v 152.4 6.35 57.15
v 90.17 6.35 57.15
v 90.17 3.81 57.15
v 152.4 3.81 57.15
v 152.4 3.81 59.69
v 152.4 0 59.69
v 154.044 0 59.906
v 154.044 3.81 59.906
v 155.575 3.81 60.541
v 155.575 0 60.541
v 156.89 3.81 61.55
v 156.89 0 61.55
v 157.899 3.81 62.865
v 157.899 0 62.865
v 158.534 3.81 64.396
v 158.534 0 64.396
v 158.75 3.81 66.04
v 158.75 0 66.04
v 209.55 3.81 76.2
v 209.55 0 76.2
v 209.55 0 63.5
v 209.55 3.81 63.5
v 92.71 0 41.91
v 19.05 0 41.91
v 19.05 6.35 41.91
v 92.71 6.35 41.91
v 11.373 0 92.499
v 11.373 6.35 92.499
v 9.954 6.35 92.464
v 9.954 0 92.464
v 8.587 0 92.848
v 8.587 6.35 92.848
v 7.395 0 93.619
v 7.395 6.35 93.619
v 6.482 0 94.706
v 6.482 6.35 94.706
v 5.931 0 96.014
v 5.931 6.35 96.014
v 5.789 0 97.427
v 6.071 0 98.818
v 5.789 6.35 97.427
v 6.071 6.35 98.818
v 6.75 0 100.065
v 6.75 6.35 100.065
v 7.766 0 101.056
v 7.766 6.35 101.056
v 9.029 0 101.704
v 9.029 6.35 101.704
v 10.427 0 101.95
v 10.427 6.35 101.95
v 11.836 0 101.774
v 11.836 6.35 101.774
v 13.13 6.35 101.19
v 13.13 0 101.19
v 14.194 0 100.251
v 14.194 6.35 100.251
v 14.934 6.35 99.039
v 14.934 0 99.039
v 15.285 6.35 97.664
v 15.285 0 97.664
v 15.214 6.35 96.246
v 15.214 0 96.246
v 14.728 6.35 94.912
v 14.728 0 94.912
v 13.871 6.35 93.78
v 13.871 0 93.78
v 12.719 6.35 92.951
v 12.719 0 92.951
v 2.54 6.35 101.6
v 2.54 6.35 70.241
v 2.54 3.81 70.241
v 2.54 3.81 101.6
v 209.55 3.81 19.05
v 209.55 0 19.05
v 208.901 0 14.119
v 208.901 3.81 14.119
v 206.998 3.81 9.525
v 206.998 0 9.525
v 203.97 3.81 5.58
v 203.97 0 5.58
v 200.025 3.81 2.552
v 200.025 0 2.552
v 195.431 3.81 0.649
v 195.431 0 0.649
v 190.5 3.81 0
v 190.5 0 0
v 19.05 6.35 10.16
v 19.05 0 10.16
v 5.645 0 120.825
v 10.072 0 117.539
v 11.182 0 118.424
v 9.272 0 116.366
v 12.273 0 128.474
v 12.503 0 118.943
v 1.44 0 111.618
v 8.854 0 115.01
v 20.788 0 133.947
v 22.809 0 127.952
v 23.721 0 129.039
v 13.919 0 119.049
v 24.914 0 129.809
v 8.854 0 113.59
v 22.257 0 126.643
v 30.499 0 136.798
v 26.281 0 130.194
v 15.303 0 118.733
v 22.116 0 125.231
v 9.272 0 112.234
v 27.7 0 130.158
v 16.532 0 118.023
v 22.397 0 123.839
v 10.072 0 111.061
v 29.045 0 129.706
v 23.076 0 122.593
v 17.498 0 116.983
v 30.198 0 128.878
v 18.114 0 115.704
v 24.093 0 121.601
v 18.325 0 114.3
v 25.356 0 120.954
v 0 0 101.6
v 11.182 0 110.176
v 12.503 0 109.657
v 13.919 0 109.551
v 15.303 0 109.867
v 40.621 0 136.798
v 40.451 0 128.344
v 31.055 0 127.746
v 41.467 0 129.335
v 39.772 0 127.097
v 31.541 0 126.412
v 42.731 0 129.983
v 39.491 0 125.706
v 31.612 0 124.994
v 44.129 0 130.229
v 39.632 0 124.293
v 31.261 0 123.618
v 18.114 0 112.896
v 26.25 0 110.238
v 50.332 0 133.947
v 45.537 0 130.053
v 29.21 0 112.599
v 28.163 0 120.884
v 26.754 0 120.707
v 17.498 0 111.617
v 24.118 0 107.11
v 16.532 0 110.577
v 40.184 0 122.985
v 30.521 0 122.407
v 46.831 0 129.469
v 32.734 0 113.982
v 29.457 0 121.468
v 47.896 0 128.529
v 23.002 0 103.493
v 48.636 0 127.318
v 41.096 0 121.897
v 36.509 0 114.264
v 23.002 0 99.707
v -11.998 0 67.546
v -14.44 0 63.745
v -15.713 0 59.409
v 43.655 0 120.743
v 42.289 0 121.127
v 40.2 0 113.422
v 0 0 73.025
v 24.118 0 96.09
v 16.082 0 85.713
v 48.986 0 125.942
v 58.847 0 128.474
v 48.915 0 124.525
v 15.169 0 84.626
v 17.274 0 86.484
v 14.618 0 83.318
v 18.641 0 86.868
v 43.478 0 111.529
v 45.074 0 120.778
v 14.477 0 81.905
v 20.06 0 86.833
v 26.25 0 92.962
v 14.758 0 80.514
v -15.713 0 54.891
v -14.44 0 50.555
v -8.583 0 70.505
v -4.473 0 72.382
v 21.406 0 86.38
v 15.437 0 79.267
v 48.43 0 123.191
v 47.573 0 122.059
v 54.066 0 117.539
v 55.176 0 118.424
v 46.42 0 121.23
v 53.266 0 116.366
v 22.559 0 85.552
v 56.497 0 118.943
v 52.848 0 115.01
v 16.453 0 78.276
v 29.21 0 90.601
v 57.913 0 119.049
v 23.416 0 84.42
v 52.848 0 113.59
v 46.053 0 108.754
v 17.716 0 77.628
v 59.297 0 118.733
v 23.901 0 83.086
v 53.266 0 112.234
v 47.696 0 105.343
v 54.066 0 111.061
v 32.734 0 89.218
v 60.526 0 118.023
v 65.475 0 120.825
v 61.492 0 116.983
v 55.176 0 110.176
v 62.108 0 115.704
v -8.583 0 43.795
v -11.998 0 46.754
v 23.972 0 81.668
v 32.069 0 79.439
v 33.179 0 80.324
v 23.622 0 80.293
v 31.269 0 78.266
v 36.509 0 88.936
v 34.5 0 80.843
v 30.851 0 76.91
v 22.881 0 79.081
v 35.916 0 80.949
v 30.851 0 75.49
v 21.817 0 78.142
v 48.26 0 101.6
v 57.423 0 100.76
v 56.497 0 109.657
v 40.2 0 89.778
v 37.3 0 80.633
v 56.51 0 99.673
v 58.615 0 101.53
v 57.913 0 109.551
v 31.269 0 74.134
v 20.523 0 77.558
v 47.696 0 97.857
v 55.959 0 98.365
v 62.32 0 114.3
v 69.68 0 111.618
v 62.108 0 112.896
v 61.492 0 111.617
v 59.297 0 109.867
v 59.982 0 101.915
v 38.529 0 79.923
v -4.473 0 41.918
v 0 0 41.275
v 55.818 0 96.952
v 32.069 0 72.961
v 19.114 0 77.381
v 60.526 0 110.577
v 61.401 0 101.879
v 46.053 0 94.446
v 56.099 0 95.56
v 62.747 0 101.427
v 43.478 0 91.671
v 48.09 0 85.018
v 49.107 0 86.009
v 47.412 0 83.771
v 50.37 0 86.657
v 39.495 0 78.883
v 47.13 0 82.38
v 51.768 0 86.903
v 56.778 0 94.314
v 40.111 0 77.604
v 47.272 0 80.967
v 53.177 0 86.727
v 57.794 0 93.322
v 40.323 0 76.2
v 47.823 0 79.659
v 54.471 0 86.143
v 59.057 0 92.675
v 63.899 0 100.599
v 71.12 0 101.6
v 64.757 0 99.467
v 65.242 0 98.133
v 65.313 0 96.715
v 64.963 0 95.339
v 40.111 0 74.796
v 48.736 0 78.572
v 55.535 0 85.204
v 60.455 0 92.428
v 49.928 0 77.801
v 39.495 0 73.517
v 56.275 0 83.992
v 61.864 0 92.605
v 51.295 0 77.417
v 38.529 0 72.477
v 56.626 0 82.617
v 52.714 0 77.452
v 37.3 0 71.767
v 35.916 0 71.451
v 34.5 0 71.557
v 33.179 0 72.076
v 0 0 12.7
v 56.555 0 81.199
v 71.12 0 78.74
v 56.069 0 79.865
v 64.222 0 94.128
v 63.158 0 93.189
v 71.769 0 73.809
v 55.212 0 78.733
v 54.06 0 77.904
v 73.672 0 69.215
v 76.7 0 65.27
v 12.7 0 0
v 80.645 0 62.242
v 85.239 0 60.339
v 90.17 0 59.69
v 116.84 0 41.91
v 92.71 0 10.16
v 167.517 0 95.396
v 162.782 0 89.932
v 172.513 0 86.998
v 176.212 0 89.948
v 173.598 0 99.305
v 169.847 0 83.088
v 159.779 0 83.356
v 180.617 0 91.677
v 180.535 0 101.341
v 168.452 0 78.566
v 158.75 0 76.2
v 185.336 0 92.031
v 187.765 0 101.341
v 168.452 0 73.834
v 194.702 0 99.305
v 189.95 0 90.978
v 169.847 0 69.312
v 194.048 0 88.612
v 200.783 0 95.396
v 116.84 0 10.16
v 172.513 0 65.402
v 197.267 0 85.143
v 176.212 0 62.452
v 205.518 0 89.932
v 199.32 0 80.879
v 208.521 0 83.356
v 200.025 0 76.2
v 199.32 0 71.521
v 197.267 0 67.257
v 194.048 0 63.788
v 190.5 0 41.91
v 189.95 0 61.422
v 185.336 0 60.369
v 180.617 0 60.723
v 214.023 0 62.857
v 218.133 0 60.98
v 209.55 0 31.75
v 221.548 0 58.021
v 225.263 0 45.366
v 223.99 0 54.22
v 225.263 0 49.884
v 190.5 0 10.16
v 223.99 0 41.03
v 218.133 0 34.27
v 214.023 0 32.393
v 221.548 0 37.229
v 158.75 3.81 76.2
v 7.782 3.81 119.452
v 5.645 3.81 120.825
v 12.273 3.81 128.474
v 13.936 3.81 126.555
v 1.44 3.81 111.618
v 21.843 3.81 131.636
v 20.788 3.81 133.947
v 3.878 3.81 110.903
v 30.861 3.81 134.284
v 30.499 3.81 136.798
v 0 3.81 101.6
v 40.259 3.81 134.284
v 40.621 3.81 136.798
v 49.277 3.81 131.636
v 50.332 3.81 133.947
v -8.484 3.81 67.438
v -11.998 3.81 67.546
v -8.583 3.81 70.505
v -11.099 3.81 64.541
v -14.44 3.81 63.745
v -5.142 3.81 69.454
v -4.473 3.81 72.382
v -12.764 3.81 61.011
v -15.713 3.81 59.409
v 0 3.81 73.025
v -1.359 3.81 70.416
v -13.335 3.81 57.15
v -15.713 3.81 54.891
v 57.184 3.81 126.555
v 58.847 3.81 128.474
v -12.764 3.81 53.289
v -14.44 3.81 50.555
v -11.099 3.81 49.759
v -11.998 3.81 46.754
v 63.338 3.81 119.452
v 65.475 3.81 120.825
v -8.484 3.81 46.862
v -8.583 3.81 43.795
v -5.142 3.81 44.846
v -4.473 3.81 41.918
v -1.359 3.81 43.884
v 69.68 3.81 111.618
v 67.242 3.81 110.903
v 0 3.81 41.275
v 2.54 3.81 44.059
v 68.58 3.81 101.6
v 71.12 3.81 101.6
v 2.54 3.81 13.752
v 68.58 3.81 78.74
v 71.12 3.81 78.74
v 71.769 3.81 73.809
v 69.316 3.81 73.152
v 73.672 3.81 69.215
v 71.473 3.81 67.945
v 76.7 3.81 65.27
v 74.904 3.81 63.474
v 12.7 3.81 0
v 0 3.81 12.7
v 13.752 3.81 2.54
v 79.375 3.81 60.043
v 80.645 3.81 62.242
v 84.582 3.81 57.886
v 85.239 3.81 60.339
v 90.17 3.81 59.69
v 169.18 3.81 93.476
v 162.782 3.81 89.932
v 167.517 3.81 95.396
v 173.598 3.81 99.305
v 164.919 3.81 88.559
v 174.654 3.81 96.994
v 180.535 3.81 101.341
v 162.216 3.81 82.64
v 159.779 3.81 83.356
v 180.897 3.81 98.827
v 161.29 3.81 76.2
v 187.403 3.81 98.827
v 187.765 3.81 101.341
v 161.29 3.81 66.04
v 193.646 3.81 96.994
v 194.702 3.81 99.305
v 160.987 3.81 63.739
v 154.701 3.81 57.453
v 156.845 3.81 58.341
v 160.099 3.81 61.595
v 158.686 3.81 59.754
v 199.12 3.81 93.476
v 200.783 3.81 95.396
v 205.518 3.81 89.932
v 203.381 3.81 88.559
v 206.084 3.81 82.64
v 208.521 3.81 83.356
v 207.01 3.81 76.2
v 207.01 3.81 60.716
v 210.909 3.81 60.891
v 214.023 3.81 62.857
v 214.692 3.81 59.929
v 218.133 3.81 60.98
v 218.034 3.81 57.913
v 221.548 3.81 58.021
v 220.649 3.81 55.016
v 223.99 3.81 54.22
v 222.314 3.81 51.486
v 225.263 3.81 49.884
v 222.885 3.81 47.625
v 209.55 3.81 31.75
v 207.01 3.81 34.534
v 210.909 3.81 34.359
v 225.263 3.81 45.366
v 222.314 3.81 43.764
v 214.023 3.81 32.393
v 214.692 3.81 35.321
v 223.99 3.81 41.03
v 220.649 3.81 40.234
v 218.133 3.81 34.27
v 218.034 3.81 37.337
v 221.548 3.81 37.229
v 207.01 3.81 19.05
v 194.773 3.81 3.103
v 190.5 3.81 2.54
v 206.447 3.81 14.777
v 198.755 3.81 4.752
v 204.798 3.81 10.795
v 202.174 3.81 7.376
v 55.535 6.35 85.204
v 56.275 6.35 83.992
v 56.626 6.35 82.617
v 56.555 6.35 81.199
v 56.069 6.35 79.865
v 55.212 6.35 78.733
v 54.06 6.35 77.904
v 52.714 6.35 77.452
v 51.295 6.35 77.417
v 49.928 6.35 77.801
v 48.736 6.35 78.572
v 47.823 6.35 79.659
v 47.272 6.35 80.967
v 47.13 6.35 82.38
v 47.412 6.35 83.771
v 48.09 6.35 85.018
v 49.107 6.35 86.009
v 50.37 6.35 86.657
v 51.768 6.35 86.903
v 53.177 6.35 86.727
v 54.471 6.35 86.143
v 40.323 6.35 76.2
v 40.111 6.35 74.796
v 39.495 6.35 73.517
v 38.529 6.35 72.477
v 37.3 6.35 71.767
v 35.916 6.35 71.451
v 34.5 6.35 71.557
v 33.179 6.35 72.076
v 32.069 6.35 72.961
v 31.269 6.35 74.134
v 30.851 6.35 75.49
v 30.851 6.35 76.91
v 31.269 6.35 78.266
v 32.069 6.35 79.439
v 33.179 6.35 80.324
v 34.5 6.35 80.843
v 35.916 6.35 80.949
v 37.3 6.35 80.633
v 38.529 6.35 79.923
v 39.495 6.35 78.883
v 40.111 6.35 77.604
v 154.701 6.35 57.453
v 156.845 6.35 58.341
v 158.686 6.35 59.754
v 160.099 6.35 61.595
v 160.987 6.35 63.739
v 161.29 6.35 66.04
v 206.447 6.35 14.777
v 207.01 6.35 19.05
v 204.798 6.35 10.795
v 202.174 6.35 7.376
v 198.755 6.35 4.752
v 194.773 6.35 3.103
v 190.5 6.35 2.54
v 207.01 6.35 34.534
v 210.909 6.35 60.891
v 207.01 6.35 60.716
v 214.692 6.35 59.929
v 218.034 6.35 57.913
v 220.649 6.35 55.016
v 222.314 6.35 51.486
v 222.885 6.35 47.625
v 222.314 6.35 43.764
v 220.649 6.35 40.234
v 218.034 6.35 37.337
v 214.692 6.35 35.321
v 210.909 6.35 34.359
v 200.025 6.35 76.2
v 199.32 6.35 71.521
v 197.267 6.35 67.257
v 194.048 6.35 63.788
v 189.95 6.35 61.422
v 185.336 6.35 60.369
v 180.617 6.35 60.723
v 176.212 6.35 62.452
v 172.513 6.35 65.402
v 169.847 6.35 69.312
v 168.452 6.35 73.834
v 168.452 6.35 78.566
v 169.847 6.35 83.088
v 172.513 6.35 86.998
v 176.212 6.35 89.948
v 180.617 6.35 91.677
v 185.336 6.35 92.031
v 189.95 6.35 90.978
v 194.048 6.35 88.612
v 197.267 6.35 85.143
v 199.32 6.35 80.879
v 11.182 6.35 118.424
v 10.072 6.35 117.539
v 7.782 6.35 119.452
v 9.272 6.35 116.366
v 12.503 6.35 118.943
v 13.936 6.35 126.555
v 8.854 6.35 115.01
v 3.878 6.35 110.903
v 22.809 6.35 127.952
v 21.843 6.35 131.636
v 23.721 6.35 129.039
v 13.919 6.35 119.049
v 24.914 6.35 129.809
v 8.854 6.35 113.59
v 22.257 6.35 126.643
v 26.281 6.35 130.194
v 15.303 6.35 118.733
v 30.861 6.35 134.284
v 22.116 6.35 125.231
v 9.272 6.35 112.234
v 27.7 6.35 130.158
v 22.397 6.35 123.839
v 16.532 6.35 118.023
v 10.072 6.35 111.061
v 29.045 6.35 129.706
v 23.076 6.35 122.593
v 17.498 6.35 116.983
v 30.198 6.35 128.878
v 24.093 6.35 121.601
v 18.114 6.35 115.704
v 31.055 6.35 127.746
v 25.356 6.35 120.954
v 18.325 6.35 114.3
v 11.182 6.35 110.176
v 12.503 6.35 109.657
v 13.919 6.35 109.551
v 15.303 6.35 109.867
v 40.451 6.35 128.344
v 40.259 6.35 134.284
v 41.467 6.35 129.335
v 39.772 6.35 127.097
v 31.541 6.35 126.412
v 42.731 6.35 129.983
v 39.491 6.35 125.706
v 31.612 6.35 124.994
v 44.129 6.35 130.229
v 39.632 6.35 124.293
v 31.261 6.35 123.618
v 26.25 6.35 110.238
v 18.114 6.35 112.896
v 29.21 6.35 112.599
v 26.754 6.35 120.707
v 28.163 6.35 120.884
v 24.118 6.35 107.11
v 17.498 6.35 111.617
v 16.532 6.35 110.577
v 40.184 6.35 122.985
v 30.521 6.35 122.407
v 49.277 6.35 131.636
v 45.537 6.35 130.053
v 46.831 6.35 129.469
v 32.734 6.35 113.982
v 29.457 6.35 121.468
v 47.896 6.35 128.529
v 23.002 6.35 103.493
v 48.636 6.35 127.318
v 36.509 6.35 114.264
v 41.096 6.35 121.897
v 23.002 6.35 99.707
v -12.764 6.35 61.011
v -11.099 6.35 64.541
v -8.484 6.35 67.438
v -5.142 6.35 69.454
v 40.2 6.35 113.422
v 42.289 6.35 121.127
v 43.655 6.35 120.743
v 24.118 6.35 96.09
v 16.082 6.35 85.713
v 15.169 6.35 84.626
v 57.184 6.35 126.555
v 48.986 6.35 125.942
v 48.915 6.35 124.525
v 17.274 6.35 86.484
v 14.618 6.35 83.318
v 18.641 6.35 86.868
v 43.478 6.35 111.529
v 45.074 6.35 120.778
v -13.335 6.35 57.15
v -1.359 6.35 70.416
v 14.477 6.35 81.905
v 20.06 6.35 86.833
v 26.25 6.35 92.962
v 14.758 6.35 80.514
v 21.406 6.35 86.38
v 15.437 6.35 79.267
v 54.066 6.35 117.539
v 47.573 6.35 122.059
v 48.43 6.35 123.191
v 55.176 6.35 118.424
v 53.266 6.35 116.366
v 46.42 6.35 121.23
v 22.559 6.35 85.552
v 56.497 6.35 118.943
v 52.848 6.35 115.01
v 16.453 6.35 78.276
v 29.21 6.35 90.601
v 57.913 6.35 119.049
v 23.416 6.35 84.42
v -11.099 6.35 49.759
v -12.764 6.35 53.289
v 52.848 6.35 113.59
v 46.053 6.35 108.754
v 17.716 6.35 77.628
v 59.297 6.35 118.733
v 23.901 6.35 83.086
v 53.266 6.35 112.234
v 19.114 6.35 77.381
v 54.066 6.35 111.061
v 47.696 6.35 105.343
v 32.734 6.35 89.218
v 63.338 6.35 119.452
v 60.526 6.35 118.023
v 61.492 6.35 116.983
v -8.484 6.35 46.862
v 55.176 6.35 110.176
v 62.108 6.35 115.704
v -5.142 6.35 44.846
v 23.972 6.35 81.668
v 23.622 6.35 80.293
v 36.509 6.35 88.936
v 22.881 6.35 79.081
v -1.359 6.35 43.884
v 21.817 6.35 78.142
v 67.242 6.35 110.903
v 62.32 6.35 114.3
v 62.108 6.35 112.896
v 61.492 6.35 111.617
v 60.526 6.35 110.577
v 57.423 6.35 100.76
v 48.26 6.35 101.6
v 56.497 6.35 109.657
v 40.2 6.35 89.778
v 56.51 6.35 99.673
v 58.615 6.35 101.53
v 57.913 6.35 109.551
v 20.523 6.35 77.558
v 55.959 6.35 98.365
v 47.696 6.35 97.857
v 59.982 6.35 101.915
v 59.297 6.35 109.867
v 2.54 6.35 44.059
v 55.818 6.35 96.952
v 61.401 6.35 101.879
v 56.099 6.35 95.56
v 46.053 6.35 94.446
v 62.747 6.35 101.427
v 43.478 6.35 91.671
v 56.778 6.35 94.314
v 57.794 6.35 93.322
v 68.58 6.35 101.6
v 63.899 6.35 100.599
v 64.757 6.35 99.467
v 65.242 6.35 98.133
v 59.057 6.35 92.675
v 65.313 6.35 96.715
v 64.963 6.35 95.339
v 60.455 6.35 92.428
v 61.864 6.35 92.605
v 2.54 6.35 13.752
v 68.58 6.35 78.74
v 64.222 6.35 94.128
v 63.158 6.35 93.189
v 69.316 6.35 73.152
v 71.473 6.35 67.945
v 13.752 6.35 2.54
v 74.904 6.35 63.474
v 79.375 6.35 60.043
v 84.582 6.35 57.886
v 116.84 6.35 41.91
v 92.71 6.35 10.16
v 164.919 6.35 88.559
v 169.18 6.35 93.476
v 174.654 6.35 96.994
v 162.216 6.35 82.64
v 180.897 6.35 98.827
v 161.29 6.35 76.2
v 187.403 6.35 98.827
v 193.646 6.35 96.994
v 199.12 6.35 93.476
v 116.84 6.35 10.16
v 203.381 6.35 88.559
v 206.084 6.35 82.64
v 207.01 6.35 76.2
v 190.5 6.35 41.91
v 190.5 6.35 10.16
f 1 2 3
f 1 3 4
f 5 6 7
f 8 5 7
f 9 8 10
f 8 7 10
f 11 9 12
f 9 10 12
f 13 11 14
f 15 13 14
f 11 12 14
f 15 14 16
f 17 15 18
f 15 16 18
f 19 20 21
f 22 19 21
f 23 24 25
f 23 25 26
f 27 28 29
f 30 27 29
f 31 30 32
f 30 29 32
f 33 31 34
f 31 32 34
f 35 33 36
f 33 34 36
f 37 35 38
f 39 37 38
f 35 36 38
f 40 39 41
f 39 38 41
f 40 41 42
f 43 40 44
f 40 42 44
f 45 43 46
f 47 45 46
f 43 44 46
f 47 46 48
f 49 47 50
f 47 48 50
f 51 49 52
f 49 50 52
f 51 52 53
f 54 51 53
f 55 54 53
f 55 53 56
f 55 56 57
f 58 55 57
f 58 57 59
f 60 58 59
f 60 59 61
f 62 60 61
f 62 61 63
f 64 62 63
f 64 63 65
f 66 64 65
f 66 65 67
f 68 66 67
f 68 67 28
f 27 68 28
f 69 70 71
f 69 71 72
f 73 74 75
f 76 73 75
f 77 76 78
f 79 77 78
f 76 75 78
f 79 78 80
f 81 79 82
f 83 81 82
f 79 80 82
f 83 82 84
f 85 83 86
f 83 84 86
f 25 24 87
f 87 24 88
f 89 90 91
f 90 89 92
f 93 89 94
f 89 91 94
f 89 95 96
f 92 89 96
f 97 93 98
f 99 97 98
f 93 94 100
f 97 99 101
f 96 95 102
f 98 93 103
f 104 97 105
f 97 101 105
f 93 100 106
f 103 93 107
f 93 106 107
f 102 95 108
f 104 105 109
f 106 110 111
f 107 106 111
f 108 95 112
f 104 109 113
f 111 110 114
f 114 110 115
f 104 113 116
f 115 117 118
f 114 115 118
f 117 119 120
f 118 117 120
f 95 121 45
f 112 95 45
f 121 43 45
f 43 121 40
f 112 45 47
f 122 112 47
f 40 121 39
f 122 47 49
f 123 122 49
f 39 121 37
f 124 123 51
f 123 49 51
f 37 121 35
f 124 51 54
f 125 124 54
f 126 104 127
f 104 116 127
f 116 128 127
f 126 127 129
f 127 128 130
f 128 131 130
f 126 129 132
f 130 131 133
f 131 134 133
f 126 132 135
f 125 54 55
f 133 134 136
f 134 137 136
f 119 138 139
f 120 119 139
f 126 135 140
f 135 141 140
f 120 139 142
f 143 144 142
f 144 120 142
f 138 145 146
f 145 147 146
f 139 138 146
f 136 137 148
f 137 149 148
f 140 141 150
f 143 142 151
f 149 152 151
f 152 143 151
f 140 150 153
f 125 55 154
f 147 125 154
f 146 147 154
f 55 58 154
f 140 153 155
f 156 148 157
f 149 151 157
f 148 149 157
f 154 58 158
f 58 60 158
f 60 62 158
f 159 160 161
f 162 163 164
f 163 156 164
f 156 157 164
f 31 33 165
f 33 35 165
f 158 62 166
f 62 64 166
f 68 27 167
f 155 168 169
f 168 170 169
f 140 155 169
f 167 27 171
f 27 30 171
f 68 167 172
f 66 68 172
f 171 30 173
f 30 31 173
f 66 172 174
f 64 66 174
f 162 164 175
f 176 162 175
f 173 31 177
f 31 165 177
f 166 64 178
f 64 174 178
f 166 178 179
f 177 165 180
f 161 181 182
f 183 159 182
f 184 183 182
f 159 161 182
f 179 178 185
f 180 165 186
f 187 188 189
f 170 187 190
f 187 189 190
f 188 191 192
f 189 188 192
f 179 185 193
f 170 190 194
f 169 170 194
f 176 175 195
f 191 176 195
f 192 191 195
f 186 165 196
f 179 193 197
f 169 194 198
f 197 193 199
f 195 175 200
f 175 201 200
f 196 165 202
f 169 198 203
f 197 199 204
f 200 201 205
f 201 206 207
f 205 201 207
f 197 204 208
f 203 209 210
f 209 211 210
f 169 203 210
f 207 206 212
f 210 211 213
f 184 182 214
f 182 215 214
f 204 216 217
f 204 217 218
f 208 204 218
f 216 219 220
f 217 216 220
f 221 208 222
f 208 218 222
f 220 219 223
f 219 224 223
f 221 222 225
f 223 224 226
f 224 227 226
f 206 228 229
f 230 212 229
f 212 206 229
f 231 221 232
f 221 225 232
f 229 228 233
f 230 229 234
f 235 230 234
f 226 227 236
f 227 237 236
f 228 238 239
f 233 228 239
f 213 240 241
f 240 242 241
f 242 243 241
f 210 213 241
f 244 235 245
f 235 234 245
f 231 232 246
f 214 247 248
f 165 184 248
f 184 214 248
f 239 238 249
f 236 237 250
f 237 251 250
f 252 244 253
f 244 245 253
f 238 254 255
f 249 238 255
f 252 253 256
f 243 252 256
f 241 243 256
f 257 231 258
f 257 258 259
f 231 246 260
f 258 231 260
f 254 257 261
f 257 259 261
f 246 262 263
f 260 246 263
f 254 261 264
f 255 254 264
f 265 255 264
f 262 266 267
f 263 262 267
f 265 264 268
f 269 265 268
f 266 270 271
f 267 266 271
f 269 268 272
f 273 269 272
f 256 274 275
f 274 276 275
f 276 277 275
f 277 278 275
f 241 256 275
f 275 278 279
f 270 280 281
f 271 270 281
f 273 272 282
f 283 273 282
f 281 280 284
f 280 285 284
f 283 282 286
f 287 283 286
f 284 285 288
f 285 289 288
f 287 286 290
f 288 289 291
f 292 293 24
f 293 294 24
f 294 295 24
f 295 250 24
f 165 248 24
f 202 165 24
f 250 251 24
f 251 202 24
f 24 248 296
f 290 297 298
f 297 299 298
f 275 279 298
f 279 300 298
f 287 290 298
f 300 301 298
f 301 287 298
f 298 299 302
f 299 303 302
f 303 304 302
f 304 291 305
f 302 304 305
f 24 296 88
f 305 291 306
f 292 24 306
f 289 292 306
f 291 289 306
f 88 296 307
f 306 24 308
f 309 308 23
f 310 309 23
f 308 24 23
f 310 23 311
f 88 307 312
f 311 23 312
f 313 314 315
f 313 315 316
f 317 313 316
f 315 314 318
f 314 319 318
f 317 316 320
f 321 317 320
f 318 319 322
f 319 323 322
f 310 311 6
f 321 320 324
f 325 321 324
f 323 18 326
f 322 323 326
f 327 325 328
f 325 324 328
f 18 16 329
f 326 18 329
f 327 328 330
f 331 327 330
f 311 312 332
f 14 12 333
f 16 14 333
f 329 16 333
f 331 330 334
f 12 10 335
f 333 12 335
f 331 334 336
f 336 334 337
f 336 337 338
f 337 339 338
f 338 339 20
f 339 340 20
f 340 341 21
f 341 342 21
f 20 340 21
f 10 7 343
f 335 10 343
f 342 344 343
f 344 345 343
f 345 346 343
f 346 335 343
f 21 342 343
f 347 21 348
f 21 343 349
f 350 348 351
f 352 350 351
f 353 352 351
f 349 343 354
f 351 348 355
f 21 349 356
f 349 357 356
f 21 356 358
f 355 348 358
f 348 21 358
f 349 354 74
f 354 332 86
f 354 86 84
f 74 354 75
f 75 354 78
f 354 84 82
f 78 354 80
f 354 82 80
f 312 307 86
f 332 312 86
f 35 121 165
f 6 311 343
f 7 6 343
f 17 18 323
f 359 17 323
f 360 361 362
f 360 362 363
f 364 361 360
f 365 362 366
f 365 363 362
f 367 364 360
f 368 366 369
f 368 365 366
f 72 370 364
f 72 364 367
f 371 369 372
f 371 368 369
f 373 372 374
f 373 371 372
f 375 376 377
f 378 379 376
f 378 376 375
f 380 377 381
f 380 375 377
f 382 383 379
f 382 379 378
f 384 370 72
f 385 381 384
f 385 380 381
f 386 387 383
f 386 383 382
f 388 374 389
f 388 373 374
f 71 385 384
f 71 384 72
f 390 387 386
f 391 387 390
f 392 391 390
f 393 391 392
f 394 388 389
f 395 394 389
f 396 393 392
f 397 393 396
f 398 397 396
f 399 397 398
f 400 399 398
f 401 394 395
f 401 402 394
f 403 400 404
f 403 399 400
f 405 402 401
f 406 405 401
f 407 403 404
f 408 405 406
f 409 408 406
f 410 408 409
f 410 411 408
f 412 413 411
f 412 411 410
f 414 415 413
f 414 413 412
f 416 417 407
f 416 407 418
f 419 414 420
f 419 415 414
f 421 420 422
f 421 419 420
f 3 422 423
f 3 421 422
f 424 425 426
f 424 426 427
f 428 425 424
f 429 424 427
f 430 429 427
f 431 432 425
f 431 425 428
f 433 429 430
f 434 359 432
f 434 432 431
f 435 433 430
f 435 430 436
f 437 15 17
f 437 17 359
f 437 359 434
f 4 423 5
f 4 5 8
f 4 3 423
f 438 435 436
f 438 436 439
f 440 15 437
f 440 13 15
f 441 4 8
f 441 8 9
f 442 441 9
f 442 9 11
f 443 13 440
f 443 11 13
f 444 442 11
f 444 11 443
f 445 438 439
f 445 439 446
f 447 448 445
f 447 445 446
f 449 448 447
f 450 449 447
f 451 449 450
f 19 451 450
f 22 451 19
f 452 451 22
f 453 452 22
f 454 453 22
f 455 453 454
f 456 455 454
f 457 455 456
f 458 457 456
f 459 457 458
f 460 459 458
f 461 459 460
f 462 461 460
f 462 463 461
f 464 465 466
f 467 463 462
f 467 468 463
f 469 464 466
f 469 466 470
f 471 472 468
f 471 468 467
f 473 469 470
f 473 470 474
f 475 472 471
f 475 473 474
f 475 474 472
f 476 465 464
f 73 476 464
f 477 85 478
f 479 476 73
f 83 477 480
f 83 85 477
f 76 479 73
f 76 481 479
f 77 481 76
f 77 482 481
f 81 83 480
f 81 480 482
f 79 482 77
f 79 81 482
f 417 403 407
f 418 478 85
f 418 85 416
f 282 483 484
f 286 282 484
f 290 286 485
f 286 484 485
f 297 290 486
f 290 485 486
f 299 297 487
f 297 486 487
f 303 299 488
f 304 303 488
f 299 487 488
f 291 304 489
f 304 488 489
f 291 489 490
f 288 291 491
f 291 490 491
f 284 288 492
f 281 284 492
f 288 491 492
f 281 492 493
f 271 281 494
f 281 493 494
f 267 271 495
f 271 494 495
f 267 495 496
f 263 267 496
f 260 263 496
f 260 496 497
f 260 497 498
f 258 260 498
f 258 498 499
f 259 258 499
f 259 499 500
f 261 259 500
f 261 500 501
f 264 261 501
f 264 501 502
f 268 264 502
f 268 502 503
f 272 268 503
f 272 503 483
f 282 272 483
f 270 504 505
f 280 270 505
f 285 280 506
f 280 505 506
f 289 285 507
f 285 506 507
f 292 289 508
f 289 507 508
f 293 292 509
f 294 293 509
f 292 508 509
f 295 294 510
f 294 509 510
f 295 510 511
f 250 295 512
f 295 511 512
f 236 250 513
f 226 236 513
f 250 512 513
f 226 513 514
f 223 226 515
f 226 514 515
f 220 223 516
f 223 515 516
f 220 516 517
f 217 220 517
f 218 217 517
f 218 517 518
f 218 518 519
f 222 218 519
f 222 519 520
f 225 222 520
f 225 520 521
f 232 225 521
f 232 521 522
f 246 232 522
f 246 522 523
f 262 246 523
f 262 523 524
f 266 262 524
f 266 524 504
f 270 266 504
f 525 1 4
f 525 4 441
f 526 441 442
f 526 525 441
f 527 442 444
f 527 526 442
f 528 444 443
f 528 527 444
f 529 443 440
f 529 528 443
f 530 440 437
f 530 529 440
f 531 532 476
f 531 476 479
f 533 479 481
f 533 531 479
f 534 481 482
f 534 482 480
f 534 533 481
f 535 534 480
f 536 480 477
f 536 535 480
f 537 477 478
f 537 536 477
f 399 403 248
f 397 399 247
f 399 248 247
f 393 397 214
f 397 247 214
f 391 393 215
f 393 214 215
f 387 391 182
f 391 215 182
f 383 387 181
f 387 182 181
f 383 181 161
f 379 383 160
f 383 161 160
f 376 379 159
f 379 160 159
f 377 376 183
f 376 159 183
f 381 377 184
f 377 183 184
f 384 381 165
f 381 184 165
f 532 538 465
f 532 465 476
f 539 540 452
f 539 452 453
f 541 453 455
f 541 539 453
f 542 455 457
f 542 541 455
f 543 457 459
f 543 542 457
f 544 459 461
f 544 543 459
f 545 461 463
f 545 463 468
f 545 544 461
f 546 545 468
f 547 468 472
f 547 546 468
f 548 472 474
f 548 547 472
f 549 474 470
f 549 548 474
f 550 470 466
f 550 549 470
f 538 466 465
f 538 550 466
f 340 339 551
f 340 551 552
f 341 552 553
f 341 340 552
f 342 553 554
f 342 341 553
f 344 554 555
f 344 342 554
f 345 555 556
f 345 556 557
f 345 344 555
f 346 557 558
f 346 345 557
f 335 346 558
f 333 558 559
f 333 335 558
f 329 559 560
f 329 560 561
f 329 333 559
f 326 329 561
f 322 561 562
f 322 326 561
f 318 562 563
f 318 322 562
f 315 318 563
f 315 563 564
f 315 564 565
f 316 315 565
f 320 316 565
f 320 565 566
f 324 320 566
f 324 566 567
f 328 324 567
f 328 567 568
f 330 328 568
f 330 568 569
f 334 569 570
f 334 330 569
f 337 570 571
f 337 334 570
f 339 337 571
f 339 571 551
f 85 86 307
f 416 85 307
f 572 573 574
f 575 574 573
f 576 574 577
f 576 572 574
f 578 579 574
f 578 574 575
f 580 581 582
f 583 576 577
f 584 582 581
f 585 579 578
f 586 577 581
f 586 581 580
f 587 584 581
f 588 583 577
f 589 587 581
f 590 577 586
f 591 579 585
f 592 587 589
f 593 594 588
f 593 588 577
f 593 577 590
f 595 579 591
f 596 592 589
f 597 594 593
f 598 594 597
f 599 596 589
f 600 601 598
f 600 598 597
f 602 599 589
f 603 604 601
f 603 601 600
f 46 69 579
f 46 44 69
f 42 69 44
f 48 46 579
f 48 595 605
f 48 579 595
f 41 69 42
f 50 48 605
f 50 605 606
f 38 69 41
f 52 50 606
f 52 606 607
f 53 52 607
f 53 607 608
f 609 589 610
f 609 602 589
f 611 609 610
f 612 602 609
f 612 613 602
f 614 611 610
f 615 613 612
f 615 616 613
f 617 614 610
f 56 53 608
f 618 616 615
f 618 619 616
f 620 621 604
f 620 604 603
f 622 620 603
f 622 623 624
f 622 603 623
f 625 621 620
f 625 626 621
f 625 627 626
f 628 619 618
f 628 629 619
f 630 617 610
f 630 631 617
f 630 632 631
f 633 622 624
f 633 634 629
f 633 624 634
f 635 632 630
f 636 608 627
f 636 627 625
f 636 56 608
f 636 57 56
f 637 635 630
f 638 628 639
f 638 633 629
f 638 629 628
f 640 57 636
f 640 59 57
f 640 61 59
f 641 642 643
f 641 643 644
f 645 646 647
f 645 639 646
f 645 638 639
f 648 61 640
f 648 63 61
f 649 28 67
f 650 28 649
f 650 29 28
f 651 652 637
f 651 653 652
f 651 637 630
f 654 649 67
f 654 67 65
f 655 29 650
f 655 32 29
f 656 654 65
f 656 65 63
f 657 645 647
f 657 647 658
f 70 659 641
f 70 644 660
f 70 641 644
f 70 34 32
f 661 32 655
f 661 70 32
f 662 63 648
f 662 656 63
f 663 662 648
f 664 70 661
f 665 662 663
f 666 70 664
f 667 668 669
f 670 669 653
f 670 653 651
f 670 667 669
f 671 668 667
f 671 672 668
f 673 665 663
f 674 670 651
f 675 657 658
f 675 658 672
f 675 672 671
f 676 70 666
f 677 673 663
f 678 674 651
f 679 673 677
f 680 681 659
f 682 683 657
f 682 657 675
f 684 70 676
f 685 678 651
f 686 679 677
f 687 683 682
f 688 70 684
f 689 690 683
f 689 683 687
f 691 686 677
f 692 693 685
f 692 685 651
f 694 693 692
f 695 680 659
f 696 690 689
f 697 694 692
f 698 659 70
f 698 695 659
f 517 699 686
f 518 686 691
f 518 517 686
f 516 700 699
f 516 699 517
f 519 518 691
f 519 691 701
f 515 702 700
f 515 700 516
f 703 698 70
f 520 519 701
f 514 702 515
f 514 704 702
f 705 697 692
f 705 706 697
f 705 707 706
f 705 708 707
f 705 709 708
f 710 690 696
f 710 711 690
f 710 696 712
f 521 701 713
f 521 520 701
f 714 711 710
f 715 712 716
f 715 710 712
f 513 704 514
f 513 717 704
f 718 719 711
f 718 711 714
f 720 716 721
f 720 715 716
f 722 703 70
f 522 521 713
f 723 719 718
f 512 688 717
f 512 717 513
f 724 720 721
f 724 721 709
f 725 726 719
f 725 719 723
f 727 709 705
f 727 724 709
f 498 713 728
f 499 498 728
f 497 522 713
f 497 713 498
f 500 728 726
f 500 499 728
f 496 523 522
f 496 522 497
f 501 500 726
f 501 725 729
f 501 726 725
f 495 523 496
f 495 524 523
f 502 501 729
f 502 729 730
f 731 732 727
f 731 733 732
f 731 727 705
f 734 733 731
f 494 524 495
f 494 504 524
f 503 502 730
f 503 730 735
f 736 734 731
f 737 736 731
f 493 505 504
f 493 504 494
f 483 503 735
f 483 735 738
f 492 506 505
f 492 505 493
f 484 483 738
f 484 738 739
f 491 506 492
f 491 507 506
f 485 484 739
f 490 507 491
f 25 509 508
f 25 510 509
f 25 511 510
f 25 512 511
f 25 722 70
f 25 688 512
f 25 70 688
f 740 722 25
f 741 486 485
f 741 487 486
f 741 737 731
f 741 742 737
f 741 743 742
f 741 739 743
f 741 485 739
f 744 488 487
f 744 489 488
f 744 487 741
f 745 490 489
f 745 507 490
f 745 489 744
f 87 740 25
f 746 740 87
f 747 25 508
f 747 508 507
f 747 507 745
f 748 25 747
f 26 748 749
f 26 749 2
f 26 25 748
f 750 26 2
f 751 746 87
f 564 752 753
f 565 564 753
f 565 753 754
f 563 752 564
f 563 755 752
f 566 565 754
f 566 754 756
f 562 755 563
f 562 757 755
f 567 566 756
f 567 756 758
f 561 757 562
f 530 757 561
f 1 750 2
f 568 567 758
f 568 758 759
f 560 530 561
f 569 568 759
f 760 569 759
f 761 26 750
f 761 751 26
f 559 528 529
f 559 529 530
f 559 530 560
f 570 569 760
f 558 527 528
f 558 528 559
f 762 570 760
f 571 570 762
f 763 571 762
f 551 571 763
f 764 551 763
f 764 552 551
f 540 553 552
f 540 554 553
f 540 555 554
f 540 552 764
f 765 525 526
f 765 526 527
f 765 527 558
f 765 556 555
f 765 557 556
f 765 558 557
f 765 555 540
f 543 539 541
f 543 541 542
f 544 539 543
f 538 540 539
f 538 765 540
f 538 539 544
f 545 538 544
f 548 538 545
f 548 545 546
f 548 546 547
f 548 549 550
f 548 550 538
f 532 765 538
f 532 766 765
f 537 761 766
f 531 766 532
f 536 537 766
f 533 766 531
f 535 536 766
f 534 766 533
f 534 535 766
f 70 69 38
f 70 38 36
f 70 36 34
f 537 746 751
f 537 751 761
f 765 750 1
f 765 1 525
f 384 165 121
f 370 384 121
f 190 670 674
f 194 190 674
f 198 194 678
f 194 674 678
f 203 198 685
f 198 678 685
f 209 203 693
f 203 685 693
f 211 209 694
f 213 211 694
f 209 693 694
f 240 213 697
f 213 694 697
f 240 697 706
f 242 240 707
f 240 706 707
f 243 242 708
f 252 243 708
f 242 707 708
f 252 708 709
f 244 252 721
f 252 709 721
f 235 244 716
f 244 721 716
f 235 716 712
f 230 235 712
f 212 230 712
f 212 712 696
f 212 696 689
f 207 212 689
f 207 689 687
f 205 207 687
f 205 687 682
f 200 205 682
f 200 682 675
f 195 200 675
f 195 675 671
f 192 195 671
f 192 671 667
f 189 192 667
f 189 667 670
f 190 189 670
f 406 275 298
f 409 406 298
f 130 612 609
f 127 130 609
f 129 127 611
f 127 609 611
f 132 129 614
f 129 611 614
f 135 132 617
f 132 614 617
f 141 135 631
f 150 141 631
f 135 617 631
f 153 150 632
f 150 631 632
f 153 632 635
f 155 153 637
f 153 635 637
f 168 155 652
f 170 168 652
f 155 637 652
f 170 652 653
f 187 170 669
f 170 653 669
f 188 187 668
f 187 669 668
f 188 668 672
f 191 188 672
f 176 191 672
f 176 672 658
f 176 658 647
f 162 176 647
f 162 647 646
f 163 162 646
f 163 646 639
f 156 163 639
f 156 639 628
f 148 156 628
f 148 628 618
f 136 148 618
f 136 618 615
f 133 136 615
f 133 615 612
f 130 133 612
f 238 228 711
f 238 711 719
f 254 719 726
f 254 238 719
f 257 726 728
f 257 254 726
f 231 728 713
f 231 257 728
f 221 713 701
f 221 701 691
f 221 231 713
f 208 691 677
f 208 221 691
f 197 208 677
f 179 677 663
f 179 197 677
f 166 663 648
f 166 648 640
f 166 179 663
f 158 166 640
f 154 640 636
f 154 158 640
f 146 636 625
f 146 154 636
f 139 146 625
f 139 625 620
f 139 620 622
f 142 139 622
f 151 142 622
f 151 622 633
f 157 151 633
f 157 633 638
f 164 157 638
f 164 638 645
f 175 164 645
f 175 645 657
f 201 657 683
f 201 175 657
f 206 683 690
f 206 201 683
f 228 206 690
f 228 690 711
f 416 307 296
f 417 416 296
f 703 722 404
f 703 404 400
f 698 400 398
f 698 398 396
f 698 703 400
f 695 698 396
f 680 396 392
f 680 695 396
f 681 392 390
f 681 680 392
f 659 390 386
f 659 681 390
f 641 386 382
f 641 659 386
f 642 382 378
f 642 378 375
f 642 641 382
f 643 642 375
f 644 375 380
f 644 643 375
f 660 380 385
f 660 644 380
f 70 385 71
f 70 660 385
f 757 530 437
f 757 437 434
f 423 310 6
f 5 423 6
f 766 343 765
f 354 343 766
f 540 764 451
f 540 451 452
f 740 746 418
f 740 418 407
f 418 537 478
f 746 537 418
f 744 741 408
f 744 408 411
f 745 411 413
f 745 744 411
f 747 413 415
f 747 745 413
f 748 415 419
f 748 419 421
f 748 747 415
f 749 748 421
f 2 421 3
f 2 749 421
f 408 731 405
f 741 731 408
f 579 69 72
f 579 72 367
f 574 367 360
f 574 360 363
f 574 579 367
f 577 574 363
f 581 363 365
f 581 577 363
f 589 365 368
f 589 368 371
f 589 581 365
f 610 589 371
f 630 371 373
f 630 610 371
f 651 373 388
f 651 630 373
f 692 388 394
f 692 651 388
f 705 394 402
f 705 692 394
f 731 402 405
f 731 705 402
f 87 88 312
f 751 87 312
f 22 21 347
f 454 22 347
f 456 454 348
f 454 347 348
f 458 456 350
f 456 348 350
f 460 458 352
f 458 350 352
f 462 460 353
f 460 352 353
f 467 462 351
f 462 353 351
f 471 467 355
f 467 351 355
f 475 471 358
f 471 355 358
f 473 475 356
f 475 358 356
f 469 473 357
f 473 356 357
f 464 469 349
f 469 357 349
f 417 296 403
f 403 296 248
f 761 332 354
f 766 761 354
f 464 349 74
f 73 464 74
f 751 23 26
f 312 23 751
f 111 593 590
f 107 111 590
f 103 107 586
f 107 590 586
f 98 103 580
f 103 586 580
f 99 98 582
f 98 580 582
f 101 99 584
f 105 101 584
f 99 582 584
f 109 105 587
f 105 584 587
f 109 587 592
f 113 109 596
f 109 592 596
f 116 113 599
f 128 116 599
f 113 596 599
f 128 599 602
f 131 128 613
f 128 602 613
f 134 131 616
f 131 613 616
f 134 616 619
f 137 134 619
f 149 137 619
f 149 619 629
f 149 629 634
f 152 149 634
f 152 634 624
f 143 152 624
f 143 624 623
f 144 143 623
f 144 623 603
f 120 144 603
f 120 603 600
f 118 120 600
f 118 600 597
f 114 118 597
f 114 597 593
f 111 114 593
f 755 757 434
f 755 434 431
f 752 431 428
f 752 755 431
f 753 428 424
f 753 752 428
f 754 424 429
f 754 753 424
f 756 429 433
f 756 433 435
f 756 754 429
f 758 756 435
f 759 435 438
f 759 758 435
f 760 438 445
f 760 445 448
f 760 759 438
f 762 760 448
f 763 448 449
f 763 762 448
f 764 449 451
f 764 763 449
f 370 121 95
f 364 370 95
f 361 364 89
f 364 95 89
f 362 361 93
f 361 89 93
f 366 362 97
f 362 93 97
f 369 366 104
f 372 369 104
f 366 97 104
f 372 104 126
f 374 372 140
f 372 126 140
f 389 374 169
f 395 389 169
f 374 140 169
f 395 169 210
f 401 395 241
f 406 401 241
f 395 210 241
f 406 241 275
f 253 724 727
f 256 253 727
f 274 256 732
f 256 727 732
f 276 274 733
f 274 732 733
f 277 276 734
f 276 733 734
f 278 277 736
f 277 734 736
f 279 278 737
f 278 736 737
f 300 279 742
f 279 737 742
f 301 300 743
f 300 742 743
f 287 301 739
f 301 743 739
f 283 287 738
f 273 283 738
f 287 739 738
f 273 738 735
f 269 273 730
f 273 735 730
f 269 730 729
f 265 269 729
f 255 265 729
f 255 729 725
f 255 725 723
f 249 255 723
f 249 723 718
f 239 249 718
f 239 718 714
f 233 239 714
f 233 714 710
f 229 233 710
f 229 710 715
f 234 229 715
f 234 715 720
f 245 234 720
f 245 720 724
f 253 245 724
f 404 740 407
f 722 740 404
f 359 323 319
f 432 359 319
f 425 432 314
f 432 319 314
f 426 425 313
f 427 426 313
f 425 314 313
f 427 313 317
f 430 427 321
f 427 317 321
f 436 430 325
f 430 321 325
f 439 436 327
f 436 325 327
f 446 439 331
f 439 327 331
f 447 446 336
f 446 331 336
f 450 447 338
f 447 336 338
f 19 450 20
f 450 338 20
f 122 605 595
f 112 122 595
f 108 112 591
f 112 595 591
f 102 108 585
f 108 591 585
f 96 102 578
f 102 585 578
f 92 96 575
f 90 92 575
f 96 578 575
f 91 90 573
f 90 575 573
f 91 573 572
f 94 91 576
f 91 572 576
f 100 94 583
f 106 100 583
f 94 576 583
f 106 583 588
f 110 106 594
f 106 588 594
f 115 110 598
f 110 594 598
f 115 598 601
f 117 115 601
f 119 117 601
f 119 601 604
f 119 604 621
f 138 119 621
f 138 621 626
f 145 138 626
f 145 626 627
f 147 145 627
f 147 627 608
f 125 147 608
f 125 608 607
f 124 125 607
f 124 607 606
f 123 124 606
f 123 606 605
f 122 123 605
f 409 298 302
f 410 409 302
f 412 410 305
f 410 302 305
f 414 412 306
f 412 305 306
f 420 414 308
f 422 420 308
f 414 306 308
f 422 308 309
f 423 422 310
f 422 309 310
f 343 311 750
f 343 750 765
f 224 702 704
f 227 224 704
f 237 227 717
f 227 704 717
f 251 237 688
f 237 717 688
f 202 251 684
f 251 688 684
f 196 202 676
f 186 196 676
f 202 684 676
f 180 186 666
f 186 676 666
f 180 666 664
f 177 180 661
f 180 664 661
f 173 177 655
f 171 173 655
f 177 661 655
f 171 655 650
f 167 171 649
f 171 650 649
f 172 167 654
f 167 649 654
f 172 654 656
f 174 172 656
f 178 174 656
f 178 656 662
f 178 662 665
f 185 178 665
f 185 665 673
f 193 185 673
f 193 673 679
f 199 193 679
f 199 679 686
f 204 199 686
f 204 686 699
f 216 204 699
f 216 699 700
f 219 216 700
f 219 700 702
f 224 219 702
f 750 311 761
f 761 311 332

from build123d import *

# Parameters (mm, degrees)
SKETCH1_R           = 15.875
SKETCH1_R_2         = 12.7
SKETCH1_W           = 73.66
SKETCH1_H           = 31.75
BOSS_EXTRUDE2_DEPTH = 6.35
CUT_EXTRUDE1_DEPTH  = 2.54
SKETCH3_R           = 4.7625
CUT_EXTRUDE2_DEPTH  = 7.35
CIRPATTERN1_COUNT   = 9


with BuildPart() as part:
    # Sketch1 → Boss-Extrude2 (new body)
    with BuildSketch(Plane(origin=(0, 0, 0), x_dir=(1, 0, 0), z_dir=(0, 1, 0))):
        with Locations((209.55, -47.625)):
            Circle(SKETCH1_R)
        with Locations((0, -57.15)):
            Circle(SKETCH1_R)
        with BuildLine():
            Line((209.55, -76.2), (209.55, -19.05))
            ThreePointArc((209.55, -19.05), (203.970384182, -5.579615818), (190.5, 0))
            Line((190.5, 0), (12.7, 0))
            Line((12.7, 0), (0, -12.7))
            Line((0, -12.7), (0, -101.6))
            ThreePointArc((0, -101.6), (35.56, -137.16), (71.12, -101.6))
            Line((71.12, -101.6), (71.12, -78.74))
            ThreePointArc((71.12, -78.74), (76.699615818, -65.269615818), (90.17, -59.69))
            Line((90.17, -59.69), (152.4, -59.69))
            ThreePointArc((152.4, -59.69), (156.890128061, -61.549871939), (158.75, -66.04))
            Line((158.75, -66.04), (158.75, -76.2))
            ThreePointArc((158.75, -76.2), (184.15, -101.6), (209.55, -76.2))
        make_face()
        with Locations((35.56, -101.6)):
            Circle(SKETCH1_R_2, mode=Mode.SUBTRACT)
        with Locations((184.15, -76.2)):
            Circle(SKETCH1_R, mode=Mode.SUBTRACT)
        with Locations((153.67, -26.035)):
            Rectangle(SKETCH1_W, SKETCH1_H, mode=Mode.SUBTRACT)
        with Locations((55.88, -26.035)):
            Rectangle(SKETCH1_W, SKETCH1_H, mode=Mode.SUBTRACT)
        with BuildLine():
            ThreePointArc((15.875, -57.15), (11.225320151, -45.924679849), (0, -41.275))
            Line((0, -41.275), (0, -73.025))
            ThreePointArc((0, -73.025), (11.225320151, -68.375320151), (15.875, -57.15))
        make_face()
        with BuildLine():
            Line((0, -73.025), (0, -41.275))
            ThreePointArc((0, -41.275), (-15.875, -57.15), (0, -73.025))
        make_face()
        with BuildLine():
            ThreePointArc((15.875, -57.15), (11.225320151, -45.924679849), (0, -41.275))
            Line((0, -41.275), (0, -73.025))
            ThreePointArc((0, -73.025), (11.225320151, -68.375320151), (15.875, -57.15))
        make_face()
        with BuildLine():
            Line((0, -73.025), (0, -41.275))
            ThreePointArc((0, -41.275), (-15.875, -57.15), (0, -73.025))
        make_face()
        with BuildLine():
            ThreePointArc((225.425, -47.625), (220.775320151, -36.399679849), (209.55, -31.75))
            Line((209.55, -31.75), (209.55, -63.5))
            ThreePointArc((209.55, -63.5), (220.775320151, -58.850320151), (225.425, -47.625))
        make_face()
        with BuildLine():
            Line((209.55, -63.5), (209.55, -31.75))
            ThreePointArc((209.55, -31.75), (193.675, -47.625), (209.55, -63.5))
        make_face()
        with BuildLine():
            ThreePointArc((225.425, -47.625), (220.775320151, -36.399679849), (209.55, -31.75))
            Line((209.55, -31.75), (209.55, -63.5))
            ThreePointArc((209.55, -63.5), (220.775320151, -58.850320151), (225.425, -47.625))
        make_face()
        with BuildLine():
            Line((209.55, -63.5), (209.55, -31.75))
            ThreePointArc((209.55, -31.75), (193.675, -47.625), (209.55, -63.5))
        make_face()
    extrude(amount=BOSS_EXTRUDE2_DEPTH)

    # Sketch2 → Cut-Extrude1 (cut)
    with BuildSketch(Plane(origin=(0, 6.35, 0), x_dir=(1, 0, 0), z_dir=(0, 1, 0))):
        with BuildLine():
            Line((209.55, -76.2), (209.55, -63.5))
            ThreePointArc((209.55, -63.5), (225.425, -47.625), (209.55, -31.75))
            Line((209.55, -31.75), (209.55, -19.05))
            ThreePointArc((209.55, -19.05), (203.970384182, -5.579615818), (190.5, 0))
            Line((190.5, 0), (12.7, 0))
            Line((12.7, 0), (0, -12.7))
            Line((0, -12.7), (0, -41.275))
            ThreePointArc((0, -41.275), (-15.875, -57.15), (0, -73.025))
            Line((0, -73.025), (0, -101.6))
            ThreePointArc((0, -101.6), (35.56, -137.16), (71.12, -101.6))
            Line((71.12, -101.6), (71.12, -78.74))
            ThreePointArc((71.12, -78.74), (76.699615818, -65.269615818), (90.17, -59.69))
            Line((90.17, -59.69), (152.4, -59.69))
            ThreePointArc((152.4, -59.69), (156.890128061, -61.549871939), (158.75, -66.04))
            Line((158.75, -66.04), (158.75, -76.2))
            ThreePointArc((158.75, -76.2), (184.15, -101.6), (209.55, -76.2))
        make_face()
        with BuildLine():
            Line((2.54, -13.752102448), (2.54, -44.059139639))
            ThreePointArc((2.54, -44.059139639), (-13.335, -57.15), (2.54, -70.240860361))
            Line((2.54, -70.240860361), (2.54, -101.6))
            ThreePointArc((2.54, -101.6), (35.56, -134.62), (68.58, -101.6))
            Line((68.58, -101.6), (68.58, -78.74))
            ThreePointArc((68.58, -78.74), (74.903564594, -63.473564594), (90.17, -57.15))
            Line((90.17, -57.15), (152.4, -57.15))
            ThreePointArc((152.4, -57.15), (158.686179285, -59.753820715), (161.29, -66.04))
            Line((161.29, -66.04), (161.29, -76.2))
            ThreePointArc((161.29, -76.2), (184.15, -99.06), (207.01, -76.2))
            Line((207.01, -76.2), (207.01, -60.715860361))
            ThreePointArc((207.01, -60.715860361), (222.885, -47.625), (207.01, -34.534139639))
            Line((207.01, -34.534139639), (207.01, -19.05))
            ThreePointArc((207.01, -19.05), (202.174332957, -7.375667043), (190.5, -2.54))
            Line((190.5, -2.54), (13.752102448, -2.54))
            Line((13.752102448, -2.54), (2.54, -13.752102448))
        make_face(mode=Mode.SUBTRACT)
    extrude(amount=-CUT_EXTRUDE1_DEPTH, mode=Mode.SUBTRACT)

    # Sketch3 → Cut-Extrude2 (cut, through all)
    with BuildSketch(Plane(origin=(0, 6.35, 0), x_dir=(1, 0, 0), z_dir=(0, 1, 0))):
        with Locations((35.56, -76.2)):
            Circle(SKETCH3_R)
    cut_extrude2 = extrude(amount=-CUT_EXTRUDE2_DEPTH, mode=Mode.SUBTRACT)

    # CirPattern1: Cut-Extrude2 ×9 about axis
    cirpattern1_axis = Axis((35.56, 0, 101.6), (0, 1, 0))
    for i in range(1, CIRPATTERN1_COUNT):
        add(cut_extrude2.rotate(cirpattern1_axis, i * 360 / CIRPATTERN1_COUNT), mode=Mode.SUBTRACT)


solid = part.part
